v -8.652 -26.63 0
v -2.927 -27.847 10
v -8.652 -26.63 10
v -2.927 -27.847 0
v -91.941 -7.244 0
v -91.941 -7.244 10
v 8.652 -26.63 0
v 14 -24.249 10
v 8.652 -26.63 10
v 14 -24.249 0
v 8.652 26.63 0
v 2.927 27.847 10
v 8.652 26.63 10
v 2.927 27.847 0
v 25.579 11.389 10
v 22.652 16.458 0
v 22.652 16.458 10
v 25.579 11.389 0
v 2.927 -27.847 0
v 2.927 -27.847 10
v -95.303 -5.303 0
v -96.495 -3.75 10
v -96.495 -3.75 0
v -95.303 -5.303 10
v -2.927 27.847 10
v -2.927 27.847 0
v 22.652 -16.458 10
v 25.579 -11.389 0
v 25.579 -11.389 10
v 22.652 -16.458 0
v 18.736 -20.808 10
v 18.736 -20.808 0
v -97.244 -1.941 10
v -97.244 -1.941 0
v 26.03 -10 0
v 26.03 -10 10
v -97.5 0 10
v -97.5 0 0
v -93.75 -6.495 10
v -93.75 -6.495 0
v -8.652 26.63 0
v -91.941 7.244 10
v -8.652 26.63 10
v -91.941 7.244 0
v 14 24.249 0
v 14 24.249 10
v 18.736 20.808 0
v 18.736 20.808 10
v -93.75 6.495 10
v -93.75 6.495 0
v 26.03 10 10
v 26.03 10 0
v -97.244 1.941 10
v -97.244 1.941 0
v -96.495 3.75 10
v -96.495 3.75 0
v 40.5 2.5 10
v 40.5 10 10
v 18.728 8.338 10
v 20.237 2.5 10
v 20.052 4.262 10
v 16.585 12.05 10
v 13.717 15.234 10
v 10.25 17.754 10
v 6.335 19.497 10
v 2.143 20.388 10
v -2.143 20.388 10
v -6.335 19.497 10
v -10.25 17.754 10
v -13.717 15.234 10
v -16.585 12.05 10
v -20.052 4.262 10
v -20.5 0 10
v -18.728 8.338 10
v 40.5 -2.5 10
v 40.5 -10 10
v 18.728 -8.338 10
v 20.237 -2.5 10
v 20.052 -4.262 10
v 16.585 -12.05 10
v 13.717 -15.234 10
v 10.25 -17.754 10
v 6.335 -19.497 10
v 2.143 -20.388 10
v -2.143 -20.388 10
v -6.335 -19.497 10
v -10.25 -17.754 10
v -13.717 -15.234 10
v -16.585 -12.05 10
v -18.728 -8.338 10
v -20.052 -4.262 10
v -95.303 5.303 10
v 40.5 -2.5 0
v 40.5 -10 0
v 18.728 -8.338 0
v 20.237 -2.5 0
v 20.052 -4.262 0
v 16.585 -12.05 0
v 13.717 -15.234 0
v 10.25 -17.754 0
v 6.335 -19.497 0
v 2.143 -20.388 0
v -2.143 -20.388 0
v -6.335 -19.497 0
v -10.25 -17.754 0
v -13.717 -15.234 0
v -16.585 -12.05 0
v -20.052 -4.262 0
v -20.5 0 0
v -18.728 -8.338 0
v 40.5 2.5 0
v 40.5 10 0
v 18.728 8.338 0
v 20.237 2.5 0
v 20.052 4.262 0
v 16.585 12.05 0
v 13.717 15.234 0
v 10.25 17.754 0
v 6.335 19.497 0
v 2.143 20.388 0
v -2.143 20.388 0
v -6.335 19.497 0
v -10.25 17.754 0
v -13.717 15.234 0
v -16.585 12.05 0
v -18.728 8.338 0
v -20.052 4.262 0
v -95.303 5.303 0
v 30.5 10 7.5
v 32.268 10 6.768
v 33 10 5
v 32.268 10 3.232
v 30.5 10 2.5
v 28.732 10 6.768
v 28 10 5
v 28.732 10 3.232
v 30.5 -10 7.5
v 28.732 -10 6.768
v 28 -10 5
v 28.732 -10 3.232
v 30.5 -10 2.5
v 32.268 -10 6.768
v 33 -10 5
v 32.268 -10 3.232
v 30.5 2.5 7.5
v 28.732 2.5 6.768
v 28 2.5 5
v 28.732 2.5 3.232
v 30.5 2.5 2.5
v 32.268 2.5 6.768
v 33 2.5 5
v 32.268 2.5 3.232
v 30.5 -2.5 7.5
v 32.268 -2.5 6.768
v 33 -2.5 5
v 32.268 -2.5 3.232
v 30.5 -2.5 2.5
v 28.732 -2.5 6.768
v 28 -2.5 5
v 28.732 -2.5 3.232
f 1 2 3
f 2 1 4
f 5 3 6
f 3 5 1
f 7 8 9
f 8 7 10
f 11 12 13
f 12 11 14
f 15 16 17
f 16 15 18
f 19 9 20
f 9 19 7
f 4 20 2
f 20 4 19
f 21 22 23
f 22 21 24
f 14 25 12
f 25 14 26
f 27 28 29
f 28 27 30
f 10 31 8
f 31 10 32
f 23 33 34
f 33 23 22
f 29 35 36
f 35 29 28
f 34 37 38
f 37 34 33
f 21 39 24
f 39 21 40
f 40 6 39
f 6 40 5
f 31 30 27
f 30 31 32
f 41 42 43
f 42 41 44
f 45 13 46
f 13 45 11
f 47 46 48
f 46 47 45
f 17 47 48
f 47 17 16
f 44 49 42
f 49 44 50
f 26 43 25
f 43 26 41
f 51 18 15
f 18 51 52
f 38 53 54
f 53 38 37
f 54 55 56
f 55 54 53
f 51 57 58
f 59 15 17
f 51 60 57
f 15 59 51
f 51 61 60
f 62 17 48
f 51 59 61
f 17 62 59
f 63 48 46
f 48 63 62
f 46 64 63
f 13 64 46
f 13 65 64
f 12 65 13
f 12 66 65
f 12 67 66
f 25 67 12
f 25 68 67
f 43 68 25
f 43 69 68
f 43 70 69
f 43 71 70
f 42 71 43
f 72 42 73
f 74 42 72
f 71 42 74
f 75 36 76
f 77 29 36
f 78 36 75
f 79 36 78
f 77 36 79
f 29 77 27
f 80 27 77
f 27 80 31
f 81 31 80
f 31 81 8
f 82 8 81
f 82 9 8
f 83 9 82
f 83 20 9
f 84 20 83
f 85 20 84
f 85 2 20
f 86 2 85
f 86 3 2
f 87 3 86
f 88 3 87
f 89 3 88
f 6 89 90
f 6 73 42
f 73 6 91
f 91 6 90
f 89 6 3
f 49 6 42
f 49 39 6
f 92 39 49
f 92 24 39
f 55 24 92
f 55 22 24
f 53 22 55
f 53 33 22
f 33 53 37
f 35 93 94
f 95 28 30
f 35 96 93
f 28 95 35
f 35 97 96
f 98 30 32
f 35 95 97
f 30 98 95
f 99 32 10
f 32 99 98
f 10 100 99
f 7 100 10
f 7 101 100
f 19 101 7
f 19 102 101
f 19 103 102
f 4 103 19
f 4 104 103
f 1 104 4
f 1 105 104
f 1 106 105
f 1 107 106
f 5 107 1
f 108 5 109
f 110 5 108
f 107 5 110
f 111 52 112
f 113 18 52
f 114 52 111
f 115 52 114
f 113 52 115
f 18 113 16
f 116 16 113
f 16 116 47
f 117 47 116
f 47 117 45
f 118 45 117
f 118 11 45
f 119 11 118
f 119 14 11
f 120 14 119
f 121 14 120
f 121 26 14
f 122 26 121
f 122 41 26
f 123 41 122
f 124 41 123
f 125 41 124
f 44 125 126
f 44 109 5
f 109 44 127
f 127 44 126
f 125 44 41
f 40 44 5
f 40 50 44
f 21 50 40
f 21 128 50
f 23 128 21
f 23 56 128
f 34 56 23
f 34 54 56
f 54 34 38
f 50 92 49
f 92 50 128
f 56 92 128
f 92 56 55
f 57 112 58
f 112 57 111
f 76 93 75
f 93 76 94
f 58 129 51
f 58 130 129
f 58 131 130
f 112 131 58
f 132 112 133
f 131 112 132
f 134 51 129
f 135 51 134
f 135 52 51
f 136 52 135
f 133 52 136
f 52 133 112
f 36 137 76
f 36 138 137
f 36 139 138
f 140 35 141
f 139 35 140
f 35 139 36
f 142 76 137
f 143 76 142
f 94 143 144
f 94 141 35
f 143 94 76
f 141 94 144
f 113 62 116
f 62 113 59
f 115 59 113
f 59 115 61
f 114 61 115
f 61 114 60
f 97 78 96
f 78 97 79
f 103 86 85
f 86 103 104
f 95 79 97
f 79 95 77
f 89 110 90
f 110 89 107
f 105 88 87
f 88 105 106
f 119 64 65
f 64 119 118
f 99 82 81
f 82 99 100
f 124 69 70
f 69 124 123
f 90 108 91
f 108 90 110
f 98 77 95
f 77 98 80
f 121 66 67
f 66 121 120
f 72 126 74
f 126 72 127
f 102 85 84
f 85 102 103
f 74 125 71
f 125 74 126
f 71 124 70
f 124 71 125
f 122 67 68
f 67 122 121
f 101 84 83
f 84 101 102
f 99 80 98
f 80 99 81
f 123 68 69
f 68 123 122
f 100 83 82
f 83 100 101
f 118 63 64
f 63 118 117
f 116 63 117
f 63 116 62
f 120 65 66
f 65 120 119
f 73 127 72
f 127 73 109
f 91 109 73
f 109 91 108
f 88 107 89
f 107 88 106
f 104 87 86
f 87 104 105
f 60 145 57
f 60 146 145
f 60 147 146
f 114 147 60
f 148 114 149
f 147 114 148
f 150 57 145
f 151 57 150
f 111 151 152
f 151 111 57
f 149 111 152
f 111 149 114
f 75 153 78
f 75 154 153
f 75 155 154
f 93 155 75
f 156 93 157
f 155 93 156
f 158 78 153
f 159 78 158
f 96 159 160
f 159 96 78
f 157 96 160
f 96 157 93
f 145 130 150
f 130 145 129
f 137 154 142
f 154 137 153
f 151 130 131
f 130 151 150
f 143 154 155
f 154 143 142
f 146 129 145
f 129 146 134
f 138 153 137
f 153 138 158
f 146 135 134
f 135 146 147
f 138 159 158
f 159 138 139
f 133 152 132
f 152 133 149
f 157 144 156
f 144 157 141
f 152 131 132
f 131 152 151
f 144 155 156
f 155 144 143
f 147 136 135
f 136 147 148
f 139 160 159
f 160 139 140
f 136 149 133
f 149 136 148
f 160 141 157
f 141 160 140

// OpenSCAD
inner_diameter=41; 
outer_diameter=inner_diameter+15;
Thickness=10;
Handle_length=90; 
Handle_tip_diameter=15;
Screw_diam=5;

difference(){
    union(){
        hull(){
            cylinder(Thickness,d=outer_diameter,center=false);
            translate([-Handle_length,0,0])cylinder(Thickness,d=Handle_tip_diameter,center=false);
        }
        translate([inner_diameter/2,-Screw_diam*2,0])cube([Screw_diam*4,Screw_diam*4,Thickness]);
}
union(){
    cylinder(Thickness,d=inner_diameter,center=false);
    translate([inner_diameter/3,-Screw_diam/2,0])cube([3*inner_diameter,Screw_diam,Thickness]);
    translate([inner_diameter/2+Screw_diam*2,-Screw_diam/2,Thickness/2])rotate([90,0,0])cylinder(Screw_diam*6,d=Screw_diam,center=true);
}
}
